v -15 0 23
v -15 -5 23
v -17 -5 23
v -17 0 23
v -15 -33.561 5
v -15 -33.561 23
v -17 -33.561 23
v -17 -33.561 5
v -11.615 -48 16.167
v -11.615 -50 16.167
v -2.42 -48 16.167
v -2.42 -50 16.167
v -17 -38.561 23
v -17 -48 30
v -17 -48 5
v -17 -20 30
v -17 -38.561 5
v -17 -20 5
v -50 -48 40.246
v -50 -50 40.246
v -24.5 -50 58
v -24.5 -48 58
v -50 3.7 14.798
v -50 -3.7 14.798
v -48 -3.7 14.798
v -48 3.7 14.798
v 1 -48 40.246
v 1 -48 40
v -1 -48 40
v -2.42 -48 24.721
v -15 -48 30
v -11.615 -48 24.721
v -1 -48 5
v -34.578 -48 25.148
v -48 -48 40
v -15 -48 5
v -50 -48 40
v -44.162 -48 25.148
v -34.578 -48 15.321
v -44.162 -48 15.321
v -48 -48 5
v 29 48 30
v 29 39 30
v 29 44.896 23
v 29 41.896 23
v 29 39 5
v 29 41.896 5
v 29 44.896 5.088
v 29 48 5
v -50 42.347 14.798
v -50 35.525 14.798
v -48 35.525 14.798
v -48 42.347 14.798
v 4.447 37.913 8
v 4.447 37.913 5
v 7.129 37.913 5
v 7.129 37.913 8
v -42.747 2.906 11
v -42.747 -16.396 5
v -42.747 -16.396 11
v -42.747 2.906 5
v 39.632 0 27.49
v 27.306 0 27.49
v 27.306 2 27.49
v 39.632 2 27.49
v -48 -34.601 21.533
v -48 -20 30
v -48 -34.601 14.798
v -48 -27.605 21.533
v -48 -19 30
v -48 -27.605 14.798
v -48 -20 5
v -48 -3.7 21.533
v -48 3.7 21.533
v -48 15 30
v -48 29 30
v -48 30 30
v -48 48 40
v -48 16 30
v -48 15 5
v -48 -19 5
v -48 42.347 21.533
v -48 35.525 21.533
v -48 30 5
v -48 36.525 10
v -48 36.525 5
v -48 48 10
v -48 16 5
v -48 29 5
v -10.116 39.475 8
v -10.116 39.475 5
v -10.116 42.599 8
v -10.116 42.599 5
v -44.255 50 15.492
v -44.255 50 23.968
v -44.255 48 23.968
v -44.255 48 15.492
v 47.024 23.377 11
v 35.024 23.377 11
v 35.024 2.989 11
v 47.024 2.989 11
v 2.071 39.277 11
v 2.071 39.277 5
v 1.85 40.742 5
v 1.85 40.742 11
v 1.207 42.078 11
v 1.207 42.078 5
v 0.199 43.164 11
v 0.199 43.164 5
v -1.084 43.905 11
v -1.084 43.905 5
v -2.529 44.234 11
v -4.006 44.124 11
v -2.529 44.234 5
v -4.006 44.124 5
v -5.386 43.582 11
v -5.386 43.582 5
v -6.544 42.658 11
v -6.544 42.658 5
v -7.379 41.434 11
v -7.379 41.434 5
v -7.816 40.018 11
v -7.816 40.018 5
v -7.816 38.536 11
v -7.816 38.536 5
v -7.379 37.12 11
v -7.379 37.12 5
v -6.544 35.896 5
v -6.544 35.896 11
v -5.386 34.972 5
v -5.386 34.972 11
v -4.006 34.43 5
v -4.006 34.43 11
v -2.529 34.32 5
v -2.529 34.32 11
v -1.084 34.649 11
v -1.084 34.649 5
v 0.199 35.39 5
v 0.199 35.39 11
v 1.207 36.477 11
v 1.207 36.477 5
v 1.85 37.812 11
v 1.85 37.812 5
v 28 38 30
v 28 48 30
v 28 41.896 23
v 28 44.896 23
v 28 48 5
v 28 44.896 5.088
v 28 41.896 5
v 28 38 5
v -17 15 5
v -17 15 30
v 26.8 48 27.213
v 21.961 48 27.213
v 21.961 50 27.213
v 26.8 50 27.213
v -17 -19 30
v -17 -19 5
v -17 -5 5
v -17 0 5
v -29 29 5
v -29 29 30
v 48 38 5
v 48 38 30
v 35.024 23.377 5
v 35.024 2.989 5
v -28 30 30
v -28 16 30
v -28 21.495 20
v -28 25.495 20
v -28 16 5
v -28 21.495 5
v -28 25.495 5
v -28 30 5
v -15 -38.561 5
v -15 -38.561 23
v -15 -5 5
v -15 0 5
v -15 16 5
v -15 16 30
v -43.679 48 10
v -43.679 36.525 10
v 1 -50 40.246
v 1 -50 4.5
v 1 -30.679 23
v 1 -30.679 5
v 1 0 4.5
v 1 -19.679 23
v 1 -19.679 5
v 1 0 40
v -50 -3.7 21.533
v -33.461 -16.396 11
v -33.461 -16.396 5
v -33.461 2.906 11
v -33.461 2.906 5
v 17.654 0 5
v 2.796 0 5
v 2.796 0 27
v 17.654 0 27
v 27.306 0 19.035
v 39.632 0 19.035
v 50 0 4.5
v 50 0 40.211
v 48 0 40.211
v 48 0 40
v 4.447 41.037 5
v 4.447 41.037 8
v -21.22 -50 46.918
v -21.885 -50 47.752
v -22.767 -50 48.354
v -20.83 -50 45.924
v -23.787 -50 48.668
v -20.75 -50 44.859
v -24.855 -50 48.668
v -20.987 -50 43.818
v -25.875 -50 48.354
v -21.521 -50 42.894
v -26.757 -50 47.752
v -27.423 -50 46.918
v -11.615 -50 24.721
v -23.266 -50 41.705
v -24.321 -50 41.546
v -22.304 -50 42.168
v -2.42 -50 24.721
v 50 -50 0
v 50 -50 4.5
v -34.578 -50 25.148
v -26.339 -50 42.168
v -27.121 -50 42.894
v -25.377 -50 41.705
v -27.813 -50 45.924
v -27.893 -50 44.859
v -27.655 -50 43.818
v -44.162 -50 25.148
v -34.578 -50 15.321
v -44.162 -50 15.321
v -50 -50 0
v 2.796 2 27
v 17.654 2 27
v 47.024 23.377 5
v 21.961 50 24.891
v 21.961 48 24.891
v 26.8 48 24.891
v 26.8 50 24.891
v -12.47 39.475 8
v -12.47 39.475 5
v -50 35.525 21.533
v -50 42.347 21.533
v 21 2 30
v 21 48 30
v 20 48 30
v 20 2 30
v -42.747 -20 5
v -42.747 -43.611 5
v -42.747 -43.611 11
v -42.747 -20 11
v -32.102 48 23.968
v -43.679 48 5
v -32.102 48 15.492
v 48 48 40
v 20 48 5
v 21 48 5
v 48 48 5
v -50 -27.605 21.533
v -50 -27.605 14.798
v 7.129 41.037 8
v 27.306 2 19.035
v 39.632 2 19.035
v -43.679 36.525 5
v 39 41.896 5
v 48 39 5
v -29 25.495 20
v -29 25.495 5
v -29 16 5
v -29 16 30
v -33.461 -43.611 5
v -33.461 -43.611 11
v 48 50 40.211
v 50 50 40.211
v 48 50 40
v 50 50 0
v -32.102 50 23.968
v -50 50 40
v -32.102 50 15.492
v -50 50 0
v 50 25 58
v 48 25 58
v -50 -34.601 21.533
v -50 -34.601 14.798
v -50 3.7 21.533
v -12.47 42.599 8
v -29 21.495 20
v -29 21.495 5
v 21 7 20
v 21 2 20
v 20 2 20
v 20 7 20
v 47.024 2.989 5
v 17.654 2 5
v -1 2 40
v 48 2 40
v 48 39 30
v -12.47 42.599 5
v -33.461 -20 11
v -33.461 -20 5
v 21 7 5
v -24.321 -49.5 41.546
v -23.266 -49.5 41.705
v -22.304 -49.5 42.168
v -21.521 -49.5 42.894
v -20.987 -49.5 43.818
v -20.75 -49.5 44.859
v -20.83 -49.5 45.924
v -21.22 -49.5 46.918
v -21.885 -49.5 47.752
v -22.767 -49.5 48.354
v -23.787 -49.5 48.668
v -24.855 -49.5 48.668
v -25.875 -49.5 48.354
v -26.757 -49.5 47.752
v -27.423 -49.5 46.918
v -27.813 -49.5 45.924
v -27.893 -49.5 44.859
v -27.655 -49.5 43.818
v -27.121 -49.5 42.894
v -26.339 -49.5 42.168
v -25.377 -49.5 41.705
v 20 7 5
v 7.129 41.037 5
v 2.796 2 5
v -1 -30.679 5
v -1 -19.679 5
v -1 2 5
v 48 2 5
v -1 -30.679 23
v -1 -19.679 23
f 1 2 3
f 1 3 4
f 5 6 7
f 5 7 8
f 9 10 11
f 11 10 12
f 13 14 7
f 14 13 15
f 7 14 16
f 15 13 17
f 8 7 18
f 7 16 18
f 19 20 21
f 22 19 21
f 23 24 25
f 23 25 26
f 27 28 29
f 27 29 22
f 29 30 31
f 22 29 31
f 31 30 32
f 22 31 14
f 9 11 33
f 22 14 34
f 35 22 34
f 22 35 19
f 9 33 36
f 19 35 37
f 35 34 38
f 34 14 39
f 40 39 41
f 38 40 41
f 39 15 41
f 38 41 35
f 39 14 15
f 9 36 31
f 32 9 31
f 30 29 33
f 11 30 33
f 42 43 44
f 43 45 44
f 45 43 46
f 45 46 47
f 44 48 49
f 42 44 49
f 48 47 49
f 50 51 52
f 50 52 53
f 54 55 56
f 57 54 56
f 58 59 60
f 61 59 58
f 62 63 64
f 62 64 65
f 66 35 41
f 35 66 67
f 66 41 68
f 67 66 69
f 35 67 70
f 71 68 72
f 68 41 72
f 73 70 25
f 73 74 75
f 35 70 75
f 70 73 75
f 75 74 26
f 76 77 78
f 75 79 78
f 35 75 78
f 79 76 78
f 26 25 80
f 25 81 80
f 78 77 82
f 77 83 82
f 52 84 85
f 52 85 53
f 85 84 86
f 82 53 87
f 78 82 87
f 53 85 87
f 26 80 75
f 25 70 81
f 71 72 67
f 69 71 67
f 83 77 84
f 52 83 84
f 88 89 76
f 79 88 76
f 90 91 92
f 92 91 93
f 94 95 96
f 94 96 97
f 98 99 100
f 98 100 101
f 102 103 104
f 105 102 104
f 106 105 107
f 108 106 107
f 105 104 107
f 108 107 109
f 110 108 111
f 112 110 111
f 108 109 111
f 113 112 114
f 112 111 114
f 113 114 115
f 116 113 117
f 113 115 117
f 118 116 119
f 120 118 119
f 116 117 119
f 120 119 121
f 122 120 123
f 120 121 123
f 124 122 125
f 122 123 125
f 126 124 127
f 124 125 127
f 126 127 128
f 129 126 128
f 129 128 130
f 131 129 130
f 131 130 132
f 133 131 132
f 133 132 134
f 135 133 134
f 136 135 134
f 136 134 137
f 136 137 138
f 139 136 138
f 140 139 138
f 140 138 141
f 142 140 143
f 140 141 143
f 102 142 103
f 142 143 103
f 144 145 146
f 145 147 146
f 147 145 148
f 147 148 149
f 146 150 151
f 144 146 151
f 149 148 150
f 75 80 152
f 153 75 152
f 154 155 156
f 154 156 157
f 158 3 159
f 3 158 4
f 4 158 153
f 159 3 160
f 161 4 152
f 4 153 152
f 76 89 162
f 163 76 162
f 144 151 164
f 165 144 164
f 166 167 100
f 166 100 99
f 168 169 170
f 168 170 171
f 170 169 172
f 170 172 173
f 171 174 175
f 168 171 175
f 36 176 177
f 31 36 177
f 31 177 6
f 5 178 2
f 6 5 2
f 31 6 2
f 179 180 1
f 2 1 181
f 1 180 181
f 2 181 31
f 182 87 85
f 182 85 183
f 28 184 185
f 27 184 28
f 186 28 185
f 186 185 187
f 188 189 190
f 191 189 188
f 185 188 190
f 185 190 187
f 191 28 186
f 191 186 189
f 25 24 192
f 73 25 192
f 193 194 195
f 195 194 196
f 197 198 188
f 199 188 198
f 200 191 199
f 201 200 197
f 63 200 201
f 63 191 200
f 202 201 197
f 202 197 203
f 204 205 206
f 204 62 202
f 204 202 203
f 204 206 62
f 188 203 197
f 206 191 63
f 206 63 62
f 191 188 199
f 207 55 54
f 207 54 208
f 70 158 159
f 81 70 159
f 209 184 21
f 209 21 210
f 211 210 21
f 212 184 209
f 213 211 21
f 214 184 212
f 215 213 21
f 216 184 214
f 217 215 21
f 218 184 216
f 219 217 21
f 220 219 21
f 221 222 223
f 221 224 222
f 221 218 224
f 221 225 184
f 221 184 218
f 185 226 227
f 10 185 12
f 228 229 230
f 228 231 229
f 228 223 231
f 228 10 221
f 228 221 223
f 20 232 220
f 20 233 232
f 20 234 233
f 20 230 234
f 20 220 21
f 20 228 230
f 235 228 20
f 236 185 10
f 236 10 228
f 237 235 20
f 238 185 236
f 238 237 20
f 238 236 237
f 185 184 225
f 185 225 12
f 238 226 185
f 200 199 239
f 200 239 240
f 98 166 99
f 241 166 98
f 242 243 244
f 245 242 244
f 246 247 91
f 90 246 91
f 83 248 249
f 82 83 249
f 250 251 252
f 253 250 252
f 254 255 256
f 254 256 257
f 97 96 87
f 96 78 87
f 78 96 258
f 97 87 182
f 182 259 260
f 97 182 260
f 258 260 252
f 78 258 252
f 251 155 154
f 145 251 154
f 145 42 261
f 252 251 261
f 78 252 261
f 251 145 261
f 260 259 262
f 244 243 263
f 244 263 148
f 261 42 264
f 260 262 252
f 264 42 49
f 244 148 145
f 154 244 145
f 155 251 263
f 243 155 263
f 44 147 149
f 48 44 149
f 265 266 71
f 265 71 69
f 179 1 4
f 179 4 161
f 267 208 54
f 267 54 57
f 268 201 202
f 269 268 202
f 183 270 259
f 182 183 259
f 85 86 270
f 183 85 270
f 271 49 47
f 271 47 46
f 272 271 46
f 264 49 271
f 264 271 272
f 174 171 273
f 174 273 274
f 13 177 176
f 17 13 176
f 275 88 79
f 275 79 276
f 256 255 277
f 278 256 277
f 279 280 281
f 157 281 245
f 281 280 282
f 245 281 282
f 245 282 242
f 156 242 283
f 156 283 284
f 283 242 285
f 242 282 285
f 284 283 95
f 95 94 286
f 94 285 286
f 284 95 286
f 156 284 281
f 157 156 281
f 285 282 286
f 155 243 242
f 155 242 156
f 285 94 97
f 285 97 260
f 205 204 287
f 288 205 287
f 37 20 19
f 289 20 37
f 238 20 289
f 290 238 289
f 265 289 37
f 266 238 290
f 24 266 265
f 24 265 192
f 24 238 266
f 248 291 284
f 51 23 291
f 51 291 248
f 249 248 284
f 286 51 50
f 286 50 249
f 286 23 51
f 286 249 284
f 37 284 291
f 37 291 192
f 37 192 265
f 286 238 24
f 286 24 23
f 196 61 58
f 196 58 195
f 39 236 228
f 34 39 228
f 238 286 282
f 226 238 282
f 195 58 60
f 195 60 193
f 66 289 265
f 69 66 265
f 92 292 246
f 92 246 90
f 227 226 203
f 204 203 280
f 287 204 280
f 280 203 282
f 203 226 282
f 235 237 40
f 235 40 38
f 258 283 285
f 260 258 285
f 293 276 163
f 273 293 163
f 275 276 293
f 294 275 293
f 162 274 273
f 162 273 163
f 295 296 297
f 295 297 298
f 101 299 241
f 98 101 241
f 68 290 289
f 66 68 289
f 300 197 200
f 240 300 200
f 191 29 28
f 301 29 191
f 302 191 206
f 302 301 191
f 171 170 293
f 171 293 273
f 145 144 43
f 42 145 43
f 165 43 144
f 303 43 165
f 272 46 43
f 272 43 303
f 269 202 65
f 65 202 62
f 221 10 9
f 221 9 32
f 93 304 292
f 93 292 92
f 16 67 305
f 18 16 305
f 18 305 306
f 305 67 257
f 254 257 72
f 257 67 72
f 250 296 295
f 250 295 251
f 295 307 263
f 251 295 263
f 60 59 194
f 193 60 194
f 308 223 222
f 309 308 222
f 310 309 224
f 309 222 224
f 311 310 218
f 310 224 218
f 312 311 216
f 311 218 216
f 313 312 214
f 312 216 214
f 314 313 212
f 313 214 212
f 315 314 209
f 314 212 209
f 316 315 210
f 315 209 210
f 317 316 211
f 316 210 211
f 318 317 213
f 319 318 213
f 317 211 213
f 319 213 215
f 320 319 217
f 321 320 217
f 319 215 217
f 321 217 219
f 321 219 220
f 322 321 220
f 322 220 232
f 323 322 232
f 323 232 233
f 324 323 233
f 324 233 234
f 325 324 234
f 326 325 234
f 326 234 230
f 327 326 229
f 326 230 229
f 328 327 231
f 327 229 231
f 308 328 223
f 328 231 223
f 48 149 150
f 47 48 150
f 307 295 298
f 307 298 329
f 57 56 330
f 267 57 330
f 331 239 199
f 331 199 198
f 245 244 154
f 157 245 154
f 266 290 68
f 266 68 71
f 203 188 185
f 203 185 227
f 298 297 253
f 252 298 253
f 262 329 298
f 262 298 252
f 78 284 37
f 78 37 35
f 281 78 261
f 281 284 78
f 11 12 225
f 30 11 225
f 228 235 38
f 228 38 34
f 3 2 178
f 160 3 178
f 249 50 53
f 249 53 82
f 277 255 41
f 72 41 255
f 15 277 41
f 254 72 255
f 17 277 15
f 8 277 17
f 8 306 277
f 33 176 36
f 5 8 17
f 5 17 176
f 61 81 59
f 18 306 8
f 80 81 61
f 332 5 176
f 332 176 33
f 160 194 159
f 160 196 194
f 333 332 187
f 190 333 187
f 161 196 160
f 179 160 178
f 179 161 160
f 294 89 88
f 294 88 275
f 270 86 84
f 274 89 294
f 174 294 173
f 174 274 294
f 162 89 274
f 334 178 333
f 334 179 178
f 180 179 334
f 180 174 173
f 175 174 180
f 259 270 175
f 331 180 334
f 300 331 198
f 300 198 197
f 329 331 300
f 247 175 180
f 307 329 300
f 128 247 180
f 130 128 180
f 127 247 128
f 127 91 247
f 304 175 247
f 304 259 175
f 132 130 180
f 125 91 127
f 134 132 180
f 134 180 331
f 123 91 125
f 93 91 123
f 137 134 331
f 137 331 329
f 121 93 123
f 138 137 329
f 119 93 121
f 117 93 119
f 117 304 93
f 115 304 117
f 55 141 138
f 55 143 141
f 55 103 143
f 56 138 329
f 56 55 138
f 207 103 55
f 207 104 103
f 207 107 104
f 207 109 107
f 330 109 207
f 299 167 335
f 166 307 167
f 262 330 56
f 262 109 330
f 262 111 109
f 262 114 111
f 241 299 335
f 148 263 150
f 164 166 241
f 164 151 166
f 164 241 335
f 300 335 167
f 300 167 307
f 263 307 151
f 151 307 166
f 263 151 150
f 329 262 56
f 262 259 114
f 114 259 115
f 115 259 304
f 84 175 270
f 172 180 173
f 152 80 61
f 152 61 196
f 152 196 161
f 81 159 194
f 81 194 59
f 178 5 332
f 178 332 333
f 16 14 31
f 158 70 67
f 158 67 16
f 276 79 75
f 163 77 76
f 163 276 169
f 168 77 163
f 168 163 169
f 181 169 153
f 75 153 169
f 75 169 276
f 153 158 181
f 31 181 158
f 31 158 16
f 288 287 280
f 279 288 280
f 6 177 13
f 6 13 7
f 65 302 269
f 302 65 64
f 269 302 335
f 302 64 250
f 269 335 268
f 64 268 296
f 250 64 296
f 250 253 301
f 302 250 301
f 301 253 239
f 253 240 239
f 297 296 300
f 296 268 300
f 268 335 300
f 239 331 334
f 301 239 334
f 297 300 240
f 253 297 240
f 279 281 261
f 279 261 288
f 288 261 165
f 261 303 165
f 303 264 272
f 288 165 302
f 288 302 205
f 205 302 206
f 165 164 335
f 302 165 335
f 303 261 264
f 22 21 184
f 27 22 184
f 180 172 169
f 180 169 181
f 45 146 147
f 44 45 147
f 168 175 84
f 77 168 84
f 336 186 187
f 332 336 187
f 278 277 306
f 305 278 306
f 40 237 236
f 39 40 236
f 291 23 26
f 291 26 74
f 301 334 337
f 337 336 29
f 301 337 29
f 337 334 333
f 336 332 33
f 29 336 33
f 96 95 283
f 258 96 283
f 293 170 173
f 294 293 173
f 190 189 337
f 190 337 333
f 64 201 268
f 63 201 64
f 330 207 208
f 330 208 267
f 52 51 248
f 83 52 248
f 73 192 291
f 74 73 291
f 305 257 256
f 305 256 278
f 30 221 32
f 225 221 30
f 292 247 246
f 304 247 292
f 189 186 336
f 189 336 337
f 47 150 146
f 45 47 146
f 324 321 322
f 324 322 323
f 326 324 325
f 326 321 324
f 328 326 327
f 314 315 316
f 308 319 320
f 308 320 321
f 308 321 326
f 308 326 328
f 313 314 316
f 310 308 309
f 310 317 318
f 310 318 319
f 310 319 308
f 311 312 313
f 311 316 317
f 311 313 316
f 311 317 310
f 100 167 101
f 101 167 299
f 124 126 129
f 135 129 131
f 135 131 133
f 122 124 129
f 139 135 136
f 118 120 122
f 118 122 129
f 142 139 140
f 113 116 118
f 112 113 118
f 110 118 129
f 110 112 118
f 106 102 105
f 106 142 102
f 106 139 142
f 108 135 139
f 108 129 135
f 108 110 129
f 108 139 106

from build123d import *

# Parameters (mm, degrees)
BOSS_EXTRUDE1_DEPTH  = 40
SKETCH1_19_W         = 2
SKETCH1_19_H         = 96
BOSS_EXTRUDE3_DEPTH  = 40
SKETCH1_20_W         = 98
SKETCH1_20_H         = 2
BOSS_EXTRUDE4_DEPTH  = 40
BOSS_EXTRUDE5_DEPTH  = 40
SKETCH1_23_W         = 31
SKETCH1_23_H         = 1
BOSS_EXTRUDE6_DEPTH  = 30
SKETCH1_28_W         = 2
SKETCH1_28_H         = 33
SKETCH1_28_H_2       = 30
BOSS_EXTRUDE7_DEPTH  = 30
SKETCH1_31_W         = 27
SKETCH1_31_H         = 46
SKETCH1_31_W_2       = 31
SKETCH1_31_H_2       = 32
SKETCH1_31_H_3       = 30
BOSS_EXTRUDE9_DEPTH  = 5
SKETCH5_W            = 31
SKETCH5_H            = 1
BOSS_EXTRUDE10_DEPTH = 5
BOSS_EXTRUDE15_DEPTH = 5
SKETCH8_W            = 25
SKETCH8_H            = 1
BOSS_EXTRUDE16_DEPTH = 31
SKETCH9_W            = 1
SKETCH9_H            = 46
BOSS_EXTRUDE17_DEPTH = 30
BOSS_EXTRUDE18_DEPTH = 25
SKETCH11_W           = 18
SKETCH11_H           = 5
CUT_EXTRUDE1_DEPTH   = 25
SKETCH12_W           = 15
SKETCH12_H           = 4
CUT_EXTRUDE2_DEPTH   = 17
SKETCH13_W           = 15
SKETCH13_H           = 5
CUT_EXTRUDE3_DEPTH   = 17
SKETCH15_W           = 11
SKETCH15_H           = 18
CUT_EXTRUDE7_DEPTH   = 22
SKETCH17_W           = 49
SKETCH17_H           = 5
BOSS_EXTRUDE20_DEPTH = 50
SKETCH23_W           = 18
SKETCH23_H           = 11
CUT_EXTRUDE10_DEPTH  = 6
SKETCH24_W           = 3.857458034
SKETCH24_H           = 18
CUT_EXTRUDE11_DEPTH  = 6
SKETCH25_W           = 14.857458034
SKETCH25_H           = 4
CUT_EXTRUDE12_DEPTH  = 6
SKETCH26_W           = 12.325590262
SKETCH26_H           = 8.454809573
CUT_EXTRUDE13_DEPTH  = 6
SKETCH29_W           = 6.734769559
SKETCH29_H           = 7.400595738
SKETCH29_H_2         = 6.996236091
SKETCH29_H_3         = 6.822092061
CUT_EXTRUDE18_DEPTH  = 6
SKETCH30_W           = 9.583557861
SKETCH30_H           = 9.826587516
CUT_EXTRUDE19_DEPTH  = 6
SKETCH32_W           = 9.286114252
SKETCH32_H           = 19.302332314
SKETCH32_H_2         = 23.610794175
BOSS_EXTRUDE23_DEPTH = 6
SKETCH34_R           = 4.971310263
BOSS_EXTRUDE25_DEPTH = 6
SKETCH35_W           = 2.681833229
SKETCH35_H           = 3.124257682
SKETCH35_W_2         = 2.353550061
SKETCH35_H_2         = 3.124257683
BOSS_EXTRUDE26_DEPTH = 3
SKETCH36_W           = 9.194859164
SKETCH36_H           = 8.554319738
CUT_EXTRUDE20_DEPTH  = 13
BOSS_EXTRUDE28_DEPTH = 18
CUT_EXTRUDE22_DEPTH  = 18
BOSS_EXTRUDE29_DEPTH = 18
CUT_EXTRUDE23_DEPTH  = 18
BOSS_EXTRUDE32_DEPTH = 25
CUT_EXTRUDE24_DEPTH  = 11
SKETCH50_W           = 12
SKETCH50_H           = 20.388751342
BOSS_EXTRUDE34_DEPTH = 6
SKETCH53_W           = 4.839229205
SKETCH53_H           = 2.321938391
CUT_EXTRUDE28_DEPTH  = 6
SKETCH54_W           = 12.153021564
SKETCH54_H           = 8.476910648
CUT_EXTRUDE29_DEPTH  = 6
SKETCH55_W           = 4.321031563
SKETCH55_H           = 11.474788053
BOSS_EXTRUDE36_DEPTH = 5
SKETCH56_R           = 3.581393844
CUT_EXTRUDE30_DEPTH  = 0.5
SKETCH57_W           = 49
SKETCH57_H           = 50
CUT_EXTRUDE31_DEPTH  = 0.5


with BuildPart() as part:
    # Sketch1 → Boss-Extrude1 (new body)
    with BuildSketch(Plane.XY):
        Polygon((1, -50), (1, 2), (-1, 2), (-1, -48), (-50, -48), (-50, -50), align=None)
    extrude(amount=BOSS_EXTRUDE1_DEPTH)

    # Sketch1<19> → Boss-Extrude3 (add)
    with BuildSketch(Plane.XY):
        with Locations((-49, 0)):
            Rectangle(SKETCH1_19_W, SKETCH1_19_H)
    extrude(amount=BOSS_EXTRUDE3_DEPTH)

    # Sketch1<20> → Boss-Extrude4 (add)
    with BuildSketch(Plane.XY):
        with Locations((-1, 49)):
            Rectangle(SKETCH1_20_W, SKETCH1_20_H)
    extrude(amount=BOSS_EXTRUDE4_DEPTH)

    # Sketch1<21> → Boss-Extrude5 (add)
    with BuildSketch(Plane.XY):
        Polygon((50, 50), (48, 50), (48, 2), (1, 2), (1, 0), (50, 0), align=None)
    extrude(amount=BOSS_EXTRUDE5_DEPTH)

    # Sketch1<23> → Boss-Extrude6 (add)
    with BuildSketch(Plane.XY):
        with Locations((-32.5, 15.5)):
            Rectangle(SKETCH1_23_W, SKETCH1_23_H)
    extrude(amount=BOSS_EXTRUDE6_DEPTH)

    # Sketch1<28> → Boss-Extrude7 (add)
    with BuildSketch(Plane.XY):
        with Locations((-16, -0.5)):
            Rectangle(SKETCH1_28_W, SKETCH1_28_H)
        with Locations((-16, -33)):
            Rectangle(SKETCH1_28_W, SKETCH1_28_H_2)
    extrude(amount=BOSS_EXTRUDE7_DEPTH)

    # Sketch1<31> → Boss-Extrude9 (add)
    with BuildSketch(Plane.XY):
        with Locations((34.5, 25)):
            Rectangle(SKETCH1_31_W, SKETCH1_31_H)
        Polygon((20, 2), (20, 48), (-48, 48), (-48, 16), (-15, 16), (-15, -48), (-1, -48), (-1, 2), align=None)
        with Locations((-32.5, -1)):
            Rectangle(SKETCH1_31_W_2, SKETCH1_31_H_2)
        with Locations((-32.5, -33)):
            Rectangle(SKETCH1_31_W_2, SKETCH1_31_H_3)
    extrude(amount=BOSS_EXTRUDE9_DEPTH)

    # Sketch5 → Boss-Extrude10 (add)
    with BuildSketch(Plane.XY.offset(5)):
        with Locations((-32.5, -17.5)):
            Rectangle(SKETCH5_W, SKETCH5_H)
    extrude(amount=-BOSS_EXTRUDE10_DEPTH)

    # Sketch7 → Boss-Extrude15 (add)
    with BuildSketch(Plane.XZ.offset(17)):
        Polygon((-17, 30), (-15, 30), (-15, 5), (-15, 0), (-17, 0), (-17, 5), align=None)
    extrude(amount=BOSS_EXTRUDE15_DEPTH)

    # Sketch8 → Boss-Extrude16 (add)
    with BuildSketch(Plane(origin=(-48, 0, 0), x_dir=(0, 0, -1), z_dir=(1, 0, 0))):
        with Locations((-17.5, -19.5)):
            Rectangle(SKETCH8_W, SKETCH8_H)
    extrude(amount=BOSS_EXTRUDE16_DEPTH)

    # Sketch9 → Boss-Extrude17 (add)
    with BuildSketch(Plane(origin=(0, 0, 0), x_dir=(-1, 0, 0), z_dir=(0, 0, -1))):
        with Locations((-20.5, 25)):
            Rectangle(SKETCH9_W, SKETCH9_H)
    extrude(amount=-BOSS_EXTRUDE17_DEPTH)

    # Sketch10 → Boss-Extrude18 (add)
    with BuildSketch(Plane.XY.offset(5)):
        Polygon((-29, 29), (-29, 16), (-28, 16), (-28, 30), (-48, 30), (-48, 29), align=None)
    extrude(amount=BOSS_EXTRUDE18_DEPTH)

    # Sketch11 → Cut-Extrude1 (cut)
    with BuildSketch(Plane(origin=(-15, 0, 0), x_dir=(0, 0, -1), z_dir=(1, 0, 0))):
        with Locations((-14, -36.060604297)):
            Rectangle(SKETCH11_W, SKETCH11_H)
        with Locations((-14, -2.5)):
            Rectangle(SKETCH11_W, SKETCH11_H)
    extrude(amount=-CUT_EXTRUDE1_DEPTH, mode=Mode.SUBTRACT)

    # Sketch12 → Cut-Extrude2 (cut)
    with BuildSketch(Plane(origin=(-28, 0, 0), x_dir=(0, 0, -1), z_dir=(1, 0, 0))):
        with Locations((-12.5, 23.495124875)):
            Rectangle(SKETCH12_W, SKETCH12_H)
    extrude(amount=-CUT_EXTRUDE2_DEPTH, mode=Mode.SUBTRACT)

    # Sketch13 → Cut-Extrude3 (cut)
    with BuildSketch(Plane(origin=(21, 0, 0), x_dir=(0, 0, -1), z_dir=(1, 0, 0))):
        with Locations((-12.5, 4.5)):
            Rectangle(SKETCH13_W, SKETCH13_H)
    extrude(amount=-CUT_EXTRUDE3_DEPTH, mode=Mode.SUBTRACT)

    # Sketch15 → Cut-Extrude7 (cut)
    with BuildSketch(Plane(origin=(0, 2, 0), x_dir=(1, 0, 0), z_dir=(0, 1, 0))):
        with Locations((8.296242954, -14)):
            Rectangle(SKETCH15_W, SKETCH15_H)
    extrude(amount=-CUT_EXTRUDE7_DEPTH, mode=Mode.SUBTRACT)

    # Sketch17 → Boss-Extrude20 (add)
    with BuildSketch(Plane.XZ):
        with Locations((25.5, 2.5)):
            Rectangle(SKETCH17_W, SKETCH17_H)
    extrude(amount=BOSS_EXTRUDE20_DEPTH)

    # Sketch23 → Cut-Extrude10 (cut)
    with BuildSketch(Plane(origin=(1, 0, 0), x_dir=(0, 0, -1), z_dir=(1, 0, 0))):
        with Locations((-14, -25.178566895)):
            Rectangle(SKETCH23_W, SKETCH23_H)
    extrude(amount=-CUT_EXTRUDE10_DEPTH, mode=Mode.SUBTRACT)

    # Sketch24 → Cut-Extrude11 (cut)
    with BuildSketch(Plane.XZ):
        with Locations((15.724971971, 14)):
            Rectangle(SKETCH24_W, SKETCH24_H)
    extrude(amount=-CUT_EXTRUDE11_DEPTH, mode=Mode.SUBTRACT)

    # Sketch25 → Cut-Extrude12 (cut)
    with BuildSketch(Plane.XZ):
        with Locations((10.224971971, 25)):
            Rectangle(SKETCH25_W, SKETCH25_H)
    extrude(amount=-CUT_EXTRUDE12_DEPTH, mode=Mode.SUBTRACT)

    # Sketch26 → Cut-Extrude13 (cut)
    with BuildSketch(Plane.XZ):
        with Locations((33.468904558, 23.262096897)):
            Rectangle(SKETCH26_W, SKETCH26_H)
    extrude(amount=-CUT_EXTRUDE13_DEPTH, mode=Mode.SUBTRACT)

    # Sketch29 → Cut-Extrude18 (cut)
    with BuildSketch(Plane.ZY.offset(50)):
        with Locations((18.165266651, 0)):
            Rectangle(SKETCH29_W, SKETCH29_H)
        with Locations((18.165266651, -31.10269552)):
            Rectangle(SKETCH29_W, SKETCH29_H_2)
        with Locations((18.165266651, 38.936331186)):
            Rectangle(SKETCH29_W, SKETCH29_H_3)
    extrude(amount=-CUT_EXTRUDE18_DEPTH, mode=Mode.SUBTRACT)

    # Sketch30 → Cut-Extrude19 (cut)
    with BuildSketch(Plane.XZ.offset(50)):
        with Locations((-39.37019483, 20.234587946)):
            Rectangle(SKETCH30_W, SKETCH30_H)
    extrude(amount=-CUT_EXTRUDE19_DEPTH, mode=Mode.SUBTRACT)

    # Sketch32 → Boss-Extrude23 (add)
    with BuildSketch(Plane.XY.offset(5)):
        with Locations((-38.104411192, -6.744947462)):
            Rectangle(SKETCH32_W, SKETCH32_H)
        with Locations((-38.104411192, -31.805397088)):
            Rectangle(SKETCH32_W, SKETCH32_H_2)
    extrude(amount=BOSS_EXTRUDE23_DEPTH)

    # Sketch34 → Boss-Extrude25 (add)
    with BuildSketch(Plane.XY.offset(5)):
        with Locations((-2.900130758, 39.277063679)):
            Circle(SKETCH34_R)
    extrude(amount=BOSS_EXTRUDE25_DEPTH)

    # Sketch35 → Boss-Extrude26 (add)
    with BuildSketch(Plane.XY.offset(5)):
        with Locations((5.787877094, 39.474681542)):
            Rectangle(SKETCH35_W, SKETCH35_H)
        with Locations((-11.292879581, 41.036810383)):
            Rectangle(SKETCH35_W_2, SKETCH35_H_2)
    extrude(amount=BOSS_EXTRUDE26_DEPTH)

    # Sketch36 → Cut-Extrude20 (cut)
    with BuildSketch(Plane.XZ.offset(50)):
        with Locations((-7.017388344, 20.443804938)):
            Rectangle(SKETCH36_W, SKETCH36_H)
    extrude(amount=-CUT_EXTRUDE20_DEPTH, mode=Mode.SUBTRACT)

    # Sketch40 → Boss-Extrude28 (add)
    with BuildSketch(Plane.XY.offset(40)):
        Polygon((48, 48), (48, 2), (48, 0), (50, 0), (50, 50), (48, 50), align=None)
    extrude(amount=BOSS_EXTRUDE28_DEPTH)

    # Sketch41 → Cut-Extrude22 (cut)
    with BuildSketch(Plane(origin=(50, 0, 0), x_dir=(0, 0, -1), z_dir=(1, 0, 0))):
        Polygon((-40.211442362, 50), (-58, 50), (-58, 25), align=None)
        Polygon((-40.211442362, 0), (-58, 25), (-58, 0), align=None)
    extrude(amount=-CUT_EXTRUDE22_DEPTH, mode=Mode.SUBTRACT)

    # Sketch42 → Boss-Extrude29 (add)
    with BuildSketch(Plane.XY.offset(40)):
        Polygon((-1, -48), (1, -48), (1, -50), (-50, -50), (-50, -48), (-48, -48), align=None)
    extrude(amount=BOSS_EXTRUDE29_DEPTH)

    # Sketch43 → Cut-Extrude23 (cut)
    with BuildSketch(Plane.XZ.offset(50)):
        Polygon((-50, 40.245812099), (-24.5, 58), (-50, 58), align=None)
        Polygon((1, 58), (-24.5, 58), (1, 40.245812099), align=None)
    extrude(amount=-CUT_EXTRUDE23_DEPTH, mode=Mode.SUBTRACT)

    # Sketch47 → Boss-Extrude32 (add)
    with BuildSketch(Plane.XY.offset(5)):
        Polygon((48, 38), (48, 39), (29, 39), (29, 48), (28, 48), (28, 38), align=None)
    extrude(amount=BOSS_EXTRUDE32_DEPTH)

    # Sketch48 → Cut-Extrude24 (cut)
    with BuildSketch(Plane.ZY.offset(-28)):
        Polygon((5, 41.896438564), (23, 41.896438564), (23, 44.896438564), (5.087880464, 44.896438564), align=None)
    extrude(amount=-CUT_EXTRUDE24_DEPTH, mode=Mode.SUBTRACT)

    # Sketch50 → Boss-Extrude34 (add)
    with BuildSketch(Plane.XY.offset(5)):
        with Locations((41.023523207, 13.182904819)):
            Rectangle(SKETCH50_W, SKETCH50_H)
    extrude(amount=BOSS_EXTRUDE34_DEPTH)

    # Sketch53 → Cut-Extrude28 (cut)
    with BuildSketch(Plane.XZ.offset(-48)):
        with Locations((24.380189742, 26.051851939)):
            Rectangle(SKETCH53_W, SKETCH53_H)
    extrude(amount=-CUT_EXTRUDE28_DEPTH, mode=Mode.SUBTRACT)

    # Sketch54 → Cut-Extrude29 (cut)
    with BuildSketch(Plane(origin=(0, 50, 0), x_dir=(1, 0, 0), z_dir=(0, 1, 0))):
        with Locations((-38.178470098, -19.730015028)):
            Rectangle(SKETCH54_W, SKETCH54_H)
    extrude(amount=-CUT_EXTRUDE29_DEPTH, mode=Mode.SUBTRACT)

    # Sketch55 → Boss-Extrude36 (add)
    with BuildSketch(Plane.XY.offset(5)):
        with Locations((-45.839484219, 42.262605974)):
            Rectangle(SKETCH55_W, SKETCH55_H)
    extrude(amount=BOSS_EXTRUDE36_DEPTH)

    # Sketch56 → Cut-Extrude30 (cut)
    with BuildSketch(Plane.XZ.offset(50)):
        with Locations((-24.321182171, 45.126901368)):
            Circle(SKETCH56_R)
    extrude(amount=-CUT_EXTRUDE30_DEPTH, mode=Mode.SUBTRACT)

    # Sketch57 → Cut-Extrude31 (cut)
    with BuildSketch(Plane.XY.offset(5)):
        with Locations((25.5, -25)):
            Rectangle(SKETCH57_W, SKETCH57_H)
    extrude(amount=-CUT_EXTRUDE31_DEPTH, mode=Mode.SUBTRACT)


solid = part.part
